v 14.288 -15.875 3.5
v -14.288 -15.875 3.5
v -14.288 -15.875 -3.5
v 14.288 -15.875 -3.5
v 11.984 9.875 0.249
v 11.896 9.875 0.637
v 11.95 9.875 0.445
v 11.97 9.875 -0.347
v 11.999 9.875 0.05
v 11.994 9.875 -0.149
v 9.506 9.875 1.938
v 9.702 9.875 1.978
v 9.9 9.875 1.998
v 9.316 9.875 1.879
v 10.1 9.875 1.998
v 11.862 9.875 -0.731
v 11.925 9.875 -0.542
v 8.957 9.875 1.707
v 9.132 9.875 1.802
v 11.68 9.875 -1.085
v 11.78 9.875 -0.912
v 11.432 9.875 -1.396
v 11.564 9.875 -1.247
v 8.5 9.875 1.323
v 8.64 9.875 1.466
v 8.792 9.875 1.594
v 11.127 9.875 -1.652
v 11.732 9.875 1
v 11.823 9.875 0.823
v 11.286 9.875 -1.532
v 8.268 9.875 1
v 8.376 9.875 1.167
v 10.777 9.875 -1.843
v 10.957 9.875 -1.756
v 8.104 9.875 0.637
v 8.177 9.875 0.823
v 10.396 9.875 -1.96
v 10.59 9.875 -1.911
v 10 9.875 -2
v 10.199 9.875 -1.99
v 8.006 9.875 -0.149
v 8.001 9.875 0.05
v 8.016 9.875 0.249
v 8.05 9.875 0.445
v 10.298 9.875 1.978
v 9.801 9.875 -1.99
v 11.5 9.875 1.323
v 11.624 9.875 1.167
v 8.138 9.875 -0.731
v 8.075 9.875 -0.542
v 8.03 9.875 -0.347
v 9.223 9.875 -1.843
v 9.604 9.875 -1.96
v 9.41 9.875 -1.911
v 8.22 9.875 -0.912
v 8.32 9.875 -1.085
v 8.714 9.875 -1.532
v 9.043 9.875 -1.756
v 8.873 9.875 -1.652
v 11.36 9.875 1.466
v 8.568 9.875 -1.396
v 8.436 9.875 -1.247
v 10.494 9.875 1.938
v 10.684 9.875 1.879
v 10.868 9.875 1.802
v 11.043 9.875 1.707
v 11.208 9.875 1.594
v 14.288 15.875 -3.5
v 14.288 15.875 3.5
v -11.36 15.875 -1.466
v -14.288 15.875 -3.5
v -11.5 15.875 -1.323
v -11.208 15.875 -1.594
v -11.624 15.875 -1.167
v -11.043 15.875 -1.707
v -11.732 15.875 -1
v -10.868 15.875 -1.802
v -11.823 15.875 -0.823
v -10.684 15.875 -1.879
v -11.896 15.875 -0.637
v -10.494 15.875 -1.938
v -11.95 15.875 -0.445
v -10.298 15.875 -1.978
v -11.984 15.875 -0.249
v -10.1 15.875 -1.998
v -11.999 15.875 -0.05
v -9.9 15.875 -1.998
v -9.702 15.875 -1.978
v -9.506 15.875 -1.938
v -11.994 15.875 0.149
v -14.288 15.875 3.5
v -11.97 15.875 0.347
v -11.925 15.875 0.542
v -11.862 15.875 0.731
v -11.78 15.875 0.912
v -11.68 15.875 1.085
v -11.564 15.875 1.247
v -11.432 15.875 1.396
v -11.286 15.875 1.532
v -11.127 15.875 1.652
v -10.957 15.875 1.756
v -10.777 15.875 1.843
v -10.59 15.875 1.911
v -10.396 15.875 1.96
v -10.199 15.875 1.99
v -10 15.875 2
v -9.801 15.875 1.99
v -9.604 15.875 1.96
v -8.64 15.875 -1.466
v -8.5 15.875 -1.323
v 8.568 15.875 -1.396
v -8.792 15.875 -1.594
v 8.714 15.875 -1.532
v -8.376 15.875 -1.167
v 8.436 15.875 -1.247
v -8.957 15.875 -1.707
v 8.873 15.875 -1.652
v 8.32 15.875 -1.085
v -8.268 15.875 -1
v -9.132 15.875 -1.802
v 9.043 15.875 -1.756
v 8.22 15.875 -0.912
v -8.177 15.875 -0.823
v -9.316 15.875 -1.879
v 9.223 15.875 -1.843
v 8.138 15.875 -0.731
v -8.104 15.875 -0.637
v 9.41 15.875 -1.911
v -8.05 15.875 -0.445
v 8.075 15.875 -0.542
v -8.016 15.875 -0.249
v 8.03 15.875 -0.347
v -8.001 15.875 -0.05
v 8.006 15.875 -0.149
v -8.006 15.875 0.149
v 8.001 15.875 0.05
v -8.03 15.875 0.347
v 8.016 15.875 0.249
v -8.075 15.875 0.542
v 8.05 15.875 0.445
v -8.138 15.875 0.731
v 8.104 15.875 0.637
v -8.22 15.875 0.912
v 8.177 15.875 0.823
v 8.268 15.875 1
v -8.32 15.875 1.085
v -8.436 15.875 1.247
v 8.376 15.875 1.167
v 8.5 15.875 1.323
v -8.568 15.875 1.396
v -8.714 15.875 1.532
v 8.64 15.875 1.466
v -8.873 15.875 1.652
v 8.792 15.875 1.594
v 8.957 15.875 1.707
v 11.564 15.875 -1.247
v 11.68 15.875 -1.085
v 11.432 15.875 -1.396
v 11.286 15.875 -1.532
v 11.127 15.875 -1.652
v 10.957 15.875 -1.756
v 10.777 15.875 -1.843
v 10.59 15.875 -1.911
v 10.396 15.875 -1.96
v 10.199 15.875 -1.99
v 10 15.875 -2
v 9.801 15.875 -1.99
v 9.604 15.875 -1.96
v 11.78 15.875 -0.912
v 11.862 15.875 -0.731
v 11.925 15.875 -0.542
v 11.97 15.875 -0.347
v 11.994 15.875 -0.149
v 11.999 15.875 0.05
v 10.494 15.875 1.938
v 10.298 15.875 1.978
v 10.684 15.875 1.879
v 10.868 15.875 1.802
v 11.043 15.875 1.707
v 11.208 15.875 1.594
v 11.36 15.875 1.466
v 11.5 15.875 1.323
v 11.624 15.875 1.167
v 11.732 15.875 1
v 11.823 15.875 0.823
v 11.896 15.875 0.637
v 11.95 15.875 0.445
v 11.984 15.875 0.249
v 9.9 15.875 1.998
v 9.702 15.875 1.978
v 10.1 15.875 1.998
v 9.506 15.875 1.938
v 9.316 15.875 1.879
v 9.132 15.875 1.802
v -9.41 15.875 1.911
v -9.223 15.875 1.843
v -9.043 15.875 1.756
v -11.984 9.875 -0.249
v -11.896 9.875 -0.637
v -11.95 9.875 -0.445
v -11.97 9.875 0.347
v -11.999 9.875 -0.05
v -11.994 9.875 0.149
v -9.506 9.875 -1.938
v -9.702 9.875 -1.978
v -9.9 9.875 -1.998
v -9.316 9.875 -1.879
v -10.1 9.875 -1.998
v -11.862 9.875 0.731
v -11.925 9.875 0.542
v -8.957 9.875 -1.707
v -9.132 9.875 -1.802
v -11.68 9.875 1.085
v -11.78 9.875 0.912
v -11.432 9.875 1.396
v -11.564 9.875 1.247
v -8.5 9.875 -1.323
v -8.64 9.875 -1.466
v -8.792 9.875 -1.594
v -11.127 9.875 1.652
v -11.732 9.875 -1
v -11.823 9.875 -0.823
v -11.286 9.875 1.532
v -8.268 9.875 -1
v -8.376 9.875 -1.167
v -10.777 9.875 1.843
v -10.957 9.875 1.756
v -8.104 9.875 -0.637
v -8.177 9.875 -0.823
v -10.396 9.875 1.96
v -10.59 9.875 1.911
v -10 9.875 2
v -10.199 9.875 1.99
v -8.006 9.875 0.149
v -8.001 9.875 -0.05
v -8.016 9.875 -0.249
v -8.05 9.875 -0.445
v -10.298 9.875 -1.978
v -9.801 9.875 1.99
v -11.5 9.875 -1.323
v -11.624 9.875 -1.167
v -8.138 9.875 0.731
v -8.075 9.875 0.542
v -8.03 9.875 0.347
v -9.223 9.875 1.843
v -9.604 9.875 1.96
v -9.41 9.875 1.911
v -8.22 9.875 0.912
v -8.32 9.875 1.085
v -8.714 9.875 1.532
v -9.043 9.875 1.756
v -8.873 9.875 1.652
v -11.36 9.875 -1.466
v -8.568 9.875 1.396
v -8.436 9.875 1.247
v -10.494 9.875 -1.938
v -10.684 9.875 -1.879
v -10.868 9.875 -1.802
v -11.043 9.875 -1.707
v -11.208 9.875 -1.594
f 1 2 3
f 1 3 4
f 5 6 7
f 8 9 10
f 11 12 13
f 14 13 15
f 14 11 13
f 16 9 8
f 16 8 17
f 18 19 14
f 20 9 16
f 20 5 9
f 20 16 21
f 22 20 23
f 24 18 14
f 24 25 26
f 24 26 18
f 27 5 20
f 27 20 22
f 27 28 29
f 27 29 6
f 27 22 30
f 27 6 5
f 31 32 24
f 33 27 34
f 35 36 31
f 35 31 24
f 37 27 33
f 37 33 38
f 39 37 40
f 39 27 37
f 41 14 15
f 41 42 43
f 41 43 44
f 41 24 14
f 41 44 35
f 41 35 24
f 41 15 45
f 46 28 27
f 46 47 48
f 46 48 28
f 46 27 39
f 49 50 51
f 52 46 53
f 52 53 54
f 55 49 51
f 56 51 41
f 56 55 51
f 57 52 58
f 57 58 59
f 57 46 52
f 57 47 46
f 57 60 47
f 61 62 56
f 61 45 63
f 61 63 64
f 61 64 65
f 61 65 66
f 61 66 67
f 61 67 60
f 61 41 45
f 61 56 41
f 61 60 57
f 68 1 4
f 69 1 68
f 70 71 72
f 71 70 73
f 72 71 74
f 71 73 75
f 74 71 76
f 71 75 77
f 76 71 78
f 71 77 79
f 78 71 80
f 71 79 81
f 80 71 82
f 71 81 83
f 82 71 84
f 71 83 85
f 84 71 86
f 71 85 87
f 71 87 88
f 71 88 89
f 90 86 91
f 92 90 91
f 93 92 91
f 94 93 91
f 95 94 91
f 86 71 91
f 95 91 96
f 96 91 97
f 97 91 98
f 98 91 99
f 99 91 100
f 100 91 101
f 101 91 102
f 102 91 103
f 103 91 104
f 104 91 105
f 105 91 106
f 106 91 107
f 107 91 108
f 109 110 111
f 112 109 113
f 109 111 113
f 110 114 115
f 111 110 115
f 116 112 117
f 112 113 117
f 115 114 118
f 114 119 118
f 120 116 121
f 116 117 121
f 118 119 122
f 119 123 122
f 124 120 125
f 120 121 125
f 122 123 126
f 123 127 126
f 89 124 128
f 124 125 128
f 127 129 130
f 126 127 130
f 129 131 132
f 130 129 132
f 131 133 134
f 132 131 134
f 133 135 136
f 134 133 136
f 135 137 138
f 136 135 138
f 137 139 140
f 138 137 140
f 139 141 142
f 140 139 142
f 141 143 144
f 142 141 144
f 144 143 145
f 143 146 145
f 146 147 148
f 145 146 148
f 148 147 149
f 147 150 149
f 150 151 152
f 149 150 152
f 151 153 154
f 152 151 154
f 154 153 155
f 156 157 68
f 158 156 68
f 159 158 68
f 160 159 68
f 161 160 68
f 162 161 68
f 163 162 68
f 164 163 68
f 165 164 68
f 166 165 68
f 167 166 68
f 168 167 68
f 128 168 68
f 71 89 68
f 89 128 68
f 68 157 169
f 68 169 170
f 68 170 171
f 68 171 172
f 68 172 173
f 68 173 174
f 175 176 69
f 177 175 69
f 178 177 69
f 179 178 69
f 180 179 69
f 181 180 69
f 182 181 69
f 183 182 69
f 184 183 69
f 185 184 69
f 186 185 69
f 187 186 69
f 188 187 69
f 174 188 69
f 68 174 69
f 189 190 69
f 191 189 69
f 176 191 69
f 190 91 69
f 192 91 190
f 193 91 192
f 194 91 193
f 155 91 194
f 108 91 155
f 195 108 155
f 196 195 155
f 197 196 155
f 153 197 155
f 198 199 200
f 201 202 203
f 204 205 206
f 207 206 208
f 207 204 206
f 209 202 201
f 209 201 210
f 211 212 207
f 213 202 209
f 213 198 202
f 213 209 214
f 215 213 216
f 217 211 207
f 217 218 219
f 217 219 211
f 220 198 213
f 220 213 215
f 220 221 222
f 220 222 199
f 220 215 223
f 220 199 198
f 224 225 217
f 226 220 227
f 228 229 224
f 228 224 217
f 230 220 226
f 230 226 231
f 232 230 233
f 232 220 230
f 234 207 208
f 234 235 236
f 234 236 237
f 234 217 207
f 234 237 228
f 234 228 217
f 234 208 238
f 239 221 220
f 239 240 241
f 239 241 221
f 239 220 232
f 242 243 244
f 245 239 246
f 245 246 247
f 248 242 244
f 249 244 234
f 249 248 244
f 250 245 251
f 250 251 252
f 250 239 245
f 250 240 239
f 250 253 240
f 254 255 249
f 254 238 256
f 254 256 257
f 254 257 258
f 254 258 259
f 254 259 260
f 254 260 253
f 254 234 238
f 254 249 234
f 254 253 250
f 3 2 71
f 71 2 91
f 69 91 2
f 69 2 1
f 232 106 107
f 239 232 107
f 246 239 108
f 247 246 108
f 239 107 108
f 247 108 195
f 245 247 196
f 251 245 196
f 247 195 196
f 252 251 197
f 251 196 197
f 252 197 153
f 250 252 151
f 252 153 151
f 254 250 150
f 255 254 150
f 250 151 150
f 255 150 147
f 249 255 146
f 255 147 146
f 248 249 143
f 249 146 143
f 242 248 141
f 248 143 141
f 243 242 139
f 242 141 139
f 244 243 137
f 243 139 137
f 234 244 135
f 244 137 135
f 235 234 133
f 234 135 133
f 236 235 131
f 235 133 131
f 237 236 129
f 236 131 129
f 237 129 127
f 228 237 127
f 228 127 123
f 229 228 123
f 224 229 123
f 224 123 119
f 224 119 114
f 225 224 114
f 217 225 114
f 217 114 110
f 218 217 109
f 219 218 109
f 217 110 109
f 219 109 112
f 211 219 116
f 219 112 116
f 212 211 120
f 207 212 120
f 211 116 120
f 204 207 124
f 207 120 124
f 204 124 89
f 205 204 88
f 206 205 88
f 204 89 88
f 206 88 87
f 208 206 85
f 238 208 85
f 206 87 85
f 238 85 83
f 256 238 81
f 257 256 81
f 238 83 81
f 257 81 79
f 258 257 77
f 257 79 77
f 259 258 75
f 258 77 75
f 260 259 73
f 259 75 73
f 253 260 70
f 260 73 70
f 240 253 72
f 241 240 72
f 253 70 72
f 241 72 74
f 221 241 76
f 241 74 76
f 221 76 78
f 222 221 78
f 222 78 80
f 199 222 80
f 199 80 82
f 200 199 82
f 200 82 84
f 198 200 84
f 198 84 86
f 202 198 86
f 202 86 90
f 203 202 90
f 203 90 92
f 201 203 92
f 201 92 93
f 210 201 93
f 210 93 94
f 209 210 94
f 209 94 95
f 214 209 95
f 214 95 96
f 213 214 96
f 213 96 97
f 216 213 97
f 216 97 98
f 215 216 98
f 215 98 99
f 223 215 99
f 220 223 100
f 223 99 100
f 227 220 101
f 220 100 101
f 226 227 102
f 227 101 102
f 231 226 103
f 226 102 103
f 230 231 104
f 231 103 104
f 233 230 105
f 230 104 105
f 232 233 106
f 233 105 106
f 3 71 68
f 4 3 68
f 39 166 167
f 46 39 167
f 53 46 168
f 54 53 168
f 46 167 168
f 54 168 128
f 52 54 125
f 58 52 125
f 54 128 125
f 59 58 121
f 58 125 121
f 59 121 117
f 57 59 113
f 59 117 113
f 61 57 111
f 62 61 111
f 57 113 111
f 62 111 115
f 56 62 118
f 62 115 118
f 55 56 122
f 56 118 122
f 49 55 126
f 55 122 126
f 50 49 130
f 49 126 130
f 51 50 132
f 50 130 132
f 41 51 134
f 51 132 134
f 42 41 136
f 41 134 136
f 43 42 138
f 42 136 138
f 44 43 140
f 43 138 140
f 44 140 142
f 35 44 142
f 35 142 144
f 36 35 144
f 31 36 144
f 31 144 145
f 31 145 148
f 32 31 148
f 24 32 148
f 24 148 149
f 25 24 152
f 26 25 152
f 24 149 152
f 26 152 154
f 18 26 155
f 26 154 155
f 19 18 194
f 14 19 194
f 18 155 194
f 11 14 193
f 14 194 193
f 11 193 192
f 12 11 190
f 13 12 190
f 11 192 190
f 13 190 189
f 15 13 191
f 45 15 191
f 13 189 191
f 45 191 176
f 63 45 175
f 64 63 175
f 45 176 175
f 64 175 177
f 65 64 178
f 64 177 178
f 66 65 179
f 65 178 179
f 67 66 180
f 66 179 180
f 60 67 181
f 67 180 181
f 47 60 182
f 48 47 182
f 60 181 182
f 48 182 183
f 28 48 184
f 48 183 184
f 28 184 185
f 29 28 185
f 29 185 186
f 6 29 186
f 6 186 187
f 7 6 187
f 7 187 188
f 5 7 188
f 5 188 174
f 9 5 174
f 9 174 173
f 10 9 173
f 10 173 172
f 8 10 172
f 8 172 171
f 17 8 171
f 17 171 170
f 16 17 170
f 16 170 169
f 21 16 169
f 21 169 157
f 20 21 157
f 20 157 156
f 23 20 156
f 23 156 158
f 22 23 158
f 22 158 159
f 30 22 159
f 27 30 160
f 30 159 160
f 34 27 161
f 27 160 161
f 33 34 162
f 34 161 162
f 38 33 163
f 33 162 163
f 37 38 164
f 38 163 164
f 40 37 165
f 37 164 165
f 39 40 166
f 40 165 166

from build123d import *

# Parameters (mm, degrees)
SKETCH1_W           = 28.575
SKETCH1_H           = 31.75
BOSS_EXTRUDE1_DEPTH = 3.5
SKETCH3_R           = 2
CUT_EXTRUDE1_DEPTH  = 6


with BuildPart() as part:
    # Sketch1 → Boss-Extrude1 (new, symmetric)
    with BuildSketch(Plane.XY):
        Rectangle(SKETCH1_W, SKETCH1_H)
    extrude(amount=BOSS_EXTRUDE1_DEPTH, both=True)

    # Sketch3 → Cut-Extrude1 (cut)
    with BuildSketch(Plane(origin=(0, 15.875, 0), x_dir=(1, 0, 0), z_dir=(0, 1, 0))):
        with Locations(Location((-10, 0, 0), (0, 0, 270))):
            Circle(SKETCH3_R)
        with Locations(Location((10, 0, 0), (0, 0, 90))):
            Circle(SKETCH3_R)
    extrude(amount=-CUT_EXTRUDE1_DEPTH, mode=Mode.SUBTRACT)


solid = part.part
